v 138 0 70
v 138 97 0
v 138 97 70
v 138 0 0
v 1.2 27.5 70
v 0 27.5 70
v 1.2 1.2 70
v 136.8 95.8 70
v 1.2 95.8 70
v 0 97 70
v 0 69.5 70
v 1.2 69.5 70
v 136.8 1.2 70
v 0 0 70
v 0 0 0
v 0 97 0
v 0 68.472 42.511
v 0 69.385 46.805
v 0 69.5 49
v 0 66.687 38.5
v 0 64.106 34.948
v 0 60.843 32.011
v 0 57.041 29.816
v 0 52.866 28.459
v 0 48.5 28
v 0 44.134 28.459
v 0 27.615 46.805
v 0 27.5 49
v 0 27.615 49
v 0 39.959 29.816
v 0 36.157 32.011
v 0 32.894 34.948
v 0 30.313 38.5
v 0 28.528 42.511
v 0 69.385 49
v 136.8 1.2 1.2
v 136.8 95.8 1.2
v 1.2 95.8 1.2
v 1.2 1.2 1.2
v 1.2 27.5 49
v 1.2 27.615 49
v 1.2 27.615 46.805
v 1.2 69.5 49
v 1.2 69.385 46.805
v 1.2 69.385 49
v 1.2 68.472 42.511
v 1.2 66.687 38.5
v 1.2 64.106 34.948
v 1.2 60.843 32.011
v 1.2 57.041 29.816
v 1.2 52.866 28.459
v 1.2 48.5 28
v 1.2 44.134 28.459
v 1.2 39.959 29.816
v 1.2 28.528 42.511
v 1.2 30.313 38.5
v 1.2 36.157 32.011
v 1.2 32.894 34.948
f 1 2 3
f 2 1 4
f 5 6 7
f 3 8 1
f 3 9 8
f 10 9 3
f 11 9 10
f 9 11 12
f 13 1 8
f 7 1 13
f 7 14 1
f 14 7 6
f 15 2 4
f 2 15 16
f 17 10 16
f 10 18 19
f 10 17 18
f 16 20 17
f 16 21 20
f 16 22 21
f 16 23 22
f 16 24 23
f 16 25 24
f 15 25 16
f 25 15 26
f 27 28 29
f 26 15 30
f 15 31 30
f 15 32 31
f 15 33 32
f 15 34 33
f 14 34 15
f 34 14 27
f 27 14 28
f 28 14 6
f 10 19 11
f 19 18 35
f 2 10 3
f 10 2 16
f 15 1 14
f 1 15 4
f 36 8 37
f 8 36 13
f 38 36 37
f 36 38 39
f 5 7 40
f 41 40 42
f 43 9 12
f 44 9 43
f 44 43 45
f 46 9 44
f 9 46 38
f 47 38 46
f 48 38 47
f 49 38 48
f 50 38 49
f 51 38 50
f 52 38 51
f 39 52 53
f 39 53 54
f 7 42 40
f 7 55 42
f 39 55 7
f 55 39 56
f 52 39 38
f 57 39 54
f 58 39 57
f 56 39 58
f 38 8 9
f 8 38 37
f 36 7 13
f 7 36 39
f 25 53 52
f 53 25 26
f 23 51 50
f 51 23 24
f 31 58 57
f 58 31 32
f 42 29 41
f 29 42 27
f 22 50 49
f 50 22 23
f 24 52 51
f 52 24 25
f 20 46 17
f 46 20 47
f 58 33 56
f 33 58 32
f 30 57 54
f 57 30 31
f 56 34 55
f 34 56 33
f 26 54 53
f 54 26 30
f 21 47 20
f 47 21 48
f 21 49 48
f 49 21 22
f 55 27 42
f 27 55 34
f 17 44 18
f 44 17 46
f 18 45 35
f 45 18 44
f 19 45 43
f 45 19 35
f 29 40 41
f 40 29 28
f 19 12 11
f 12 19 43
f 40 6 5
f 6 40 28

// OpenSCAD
module cardBox_63x88(x = 100, xholes = 2, yholes = 1) {
	y = 97;
	z = 70;

	radius = z * 0.3;
	diameter = r * 2;

	material = 1.2;

	difference() {
		cube(size = [x, y, z]);
		
		translate([material, material, material])
			cube(size = [x - (material * 2), y - (material * 2), z - material]);
		
		if (xholes > 0) {
			for(i = [0: 1: xholes -1]) {
				rotate([90,0,0])
					translate([z * 0.5 + (i * (x / xholes)), z * 0.5, -material]) 
						cylinder(h = material, d = diameter);
			}
		}
		translate([0, y * 0.5, z * 0.7])
			rotate([0, 90, 0]) 
				cylinder(h = material, d = d);
		
		translate([0, (y-d) /2, z-r]) 
			cube (size = [material, d, r]);
	}
}

cardBox_63x88(x = 138, xholes = 0);

y = 97;
	z = 70;

	r = z * 0.3;
	d = r * 2;
	material = 1.2;
	
	// color ("red"){
	// 	translate([0, y * 0.5, z * 0.7])
	// 		rotate([0, 90, 0]) 
	// 			cylinder(h = material, d = d);
		
	// 	translate([0, (y-d) /2, z-r]) 
	// 		cube (size = [material, d, r]);
	// }
